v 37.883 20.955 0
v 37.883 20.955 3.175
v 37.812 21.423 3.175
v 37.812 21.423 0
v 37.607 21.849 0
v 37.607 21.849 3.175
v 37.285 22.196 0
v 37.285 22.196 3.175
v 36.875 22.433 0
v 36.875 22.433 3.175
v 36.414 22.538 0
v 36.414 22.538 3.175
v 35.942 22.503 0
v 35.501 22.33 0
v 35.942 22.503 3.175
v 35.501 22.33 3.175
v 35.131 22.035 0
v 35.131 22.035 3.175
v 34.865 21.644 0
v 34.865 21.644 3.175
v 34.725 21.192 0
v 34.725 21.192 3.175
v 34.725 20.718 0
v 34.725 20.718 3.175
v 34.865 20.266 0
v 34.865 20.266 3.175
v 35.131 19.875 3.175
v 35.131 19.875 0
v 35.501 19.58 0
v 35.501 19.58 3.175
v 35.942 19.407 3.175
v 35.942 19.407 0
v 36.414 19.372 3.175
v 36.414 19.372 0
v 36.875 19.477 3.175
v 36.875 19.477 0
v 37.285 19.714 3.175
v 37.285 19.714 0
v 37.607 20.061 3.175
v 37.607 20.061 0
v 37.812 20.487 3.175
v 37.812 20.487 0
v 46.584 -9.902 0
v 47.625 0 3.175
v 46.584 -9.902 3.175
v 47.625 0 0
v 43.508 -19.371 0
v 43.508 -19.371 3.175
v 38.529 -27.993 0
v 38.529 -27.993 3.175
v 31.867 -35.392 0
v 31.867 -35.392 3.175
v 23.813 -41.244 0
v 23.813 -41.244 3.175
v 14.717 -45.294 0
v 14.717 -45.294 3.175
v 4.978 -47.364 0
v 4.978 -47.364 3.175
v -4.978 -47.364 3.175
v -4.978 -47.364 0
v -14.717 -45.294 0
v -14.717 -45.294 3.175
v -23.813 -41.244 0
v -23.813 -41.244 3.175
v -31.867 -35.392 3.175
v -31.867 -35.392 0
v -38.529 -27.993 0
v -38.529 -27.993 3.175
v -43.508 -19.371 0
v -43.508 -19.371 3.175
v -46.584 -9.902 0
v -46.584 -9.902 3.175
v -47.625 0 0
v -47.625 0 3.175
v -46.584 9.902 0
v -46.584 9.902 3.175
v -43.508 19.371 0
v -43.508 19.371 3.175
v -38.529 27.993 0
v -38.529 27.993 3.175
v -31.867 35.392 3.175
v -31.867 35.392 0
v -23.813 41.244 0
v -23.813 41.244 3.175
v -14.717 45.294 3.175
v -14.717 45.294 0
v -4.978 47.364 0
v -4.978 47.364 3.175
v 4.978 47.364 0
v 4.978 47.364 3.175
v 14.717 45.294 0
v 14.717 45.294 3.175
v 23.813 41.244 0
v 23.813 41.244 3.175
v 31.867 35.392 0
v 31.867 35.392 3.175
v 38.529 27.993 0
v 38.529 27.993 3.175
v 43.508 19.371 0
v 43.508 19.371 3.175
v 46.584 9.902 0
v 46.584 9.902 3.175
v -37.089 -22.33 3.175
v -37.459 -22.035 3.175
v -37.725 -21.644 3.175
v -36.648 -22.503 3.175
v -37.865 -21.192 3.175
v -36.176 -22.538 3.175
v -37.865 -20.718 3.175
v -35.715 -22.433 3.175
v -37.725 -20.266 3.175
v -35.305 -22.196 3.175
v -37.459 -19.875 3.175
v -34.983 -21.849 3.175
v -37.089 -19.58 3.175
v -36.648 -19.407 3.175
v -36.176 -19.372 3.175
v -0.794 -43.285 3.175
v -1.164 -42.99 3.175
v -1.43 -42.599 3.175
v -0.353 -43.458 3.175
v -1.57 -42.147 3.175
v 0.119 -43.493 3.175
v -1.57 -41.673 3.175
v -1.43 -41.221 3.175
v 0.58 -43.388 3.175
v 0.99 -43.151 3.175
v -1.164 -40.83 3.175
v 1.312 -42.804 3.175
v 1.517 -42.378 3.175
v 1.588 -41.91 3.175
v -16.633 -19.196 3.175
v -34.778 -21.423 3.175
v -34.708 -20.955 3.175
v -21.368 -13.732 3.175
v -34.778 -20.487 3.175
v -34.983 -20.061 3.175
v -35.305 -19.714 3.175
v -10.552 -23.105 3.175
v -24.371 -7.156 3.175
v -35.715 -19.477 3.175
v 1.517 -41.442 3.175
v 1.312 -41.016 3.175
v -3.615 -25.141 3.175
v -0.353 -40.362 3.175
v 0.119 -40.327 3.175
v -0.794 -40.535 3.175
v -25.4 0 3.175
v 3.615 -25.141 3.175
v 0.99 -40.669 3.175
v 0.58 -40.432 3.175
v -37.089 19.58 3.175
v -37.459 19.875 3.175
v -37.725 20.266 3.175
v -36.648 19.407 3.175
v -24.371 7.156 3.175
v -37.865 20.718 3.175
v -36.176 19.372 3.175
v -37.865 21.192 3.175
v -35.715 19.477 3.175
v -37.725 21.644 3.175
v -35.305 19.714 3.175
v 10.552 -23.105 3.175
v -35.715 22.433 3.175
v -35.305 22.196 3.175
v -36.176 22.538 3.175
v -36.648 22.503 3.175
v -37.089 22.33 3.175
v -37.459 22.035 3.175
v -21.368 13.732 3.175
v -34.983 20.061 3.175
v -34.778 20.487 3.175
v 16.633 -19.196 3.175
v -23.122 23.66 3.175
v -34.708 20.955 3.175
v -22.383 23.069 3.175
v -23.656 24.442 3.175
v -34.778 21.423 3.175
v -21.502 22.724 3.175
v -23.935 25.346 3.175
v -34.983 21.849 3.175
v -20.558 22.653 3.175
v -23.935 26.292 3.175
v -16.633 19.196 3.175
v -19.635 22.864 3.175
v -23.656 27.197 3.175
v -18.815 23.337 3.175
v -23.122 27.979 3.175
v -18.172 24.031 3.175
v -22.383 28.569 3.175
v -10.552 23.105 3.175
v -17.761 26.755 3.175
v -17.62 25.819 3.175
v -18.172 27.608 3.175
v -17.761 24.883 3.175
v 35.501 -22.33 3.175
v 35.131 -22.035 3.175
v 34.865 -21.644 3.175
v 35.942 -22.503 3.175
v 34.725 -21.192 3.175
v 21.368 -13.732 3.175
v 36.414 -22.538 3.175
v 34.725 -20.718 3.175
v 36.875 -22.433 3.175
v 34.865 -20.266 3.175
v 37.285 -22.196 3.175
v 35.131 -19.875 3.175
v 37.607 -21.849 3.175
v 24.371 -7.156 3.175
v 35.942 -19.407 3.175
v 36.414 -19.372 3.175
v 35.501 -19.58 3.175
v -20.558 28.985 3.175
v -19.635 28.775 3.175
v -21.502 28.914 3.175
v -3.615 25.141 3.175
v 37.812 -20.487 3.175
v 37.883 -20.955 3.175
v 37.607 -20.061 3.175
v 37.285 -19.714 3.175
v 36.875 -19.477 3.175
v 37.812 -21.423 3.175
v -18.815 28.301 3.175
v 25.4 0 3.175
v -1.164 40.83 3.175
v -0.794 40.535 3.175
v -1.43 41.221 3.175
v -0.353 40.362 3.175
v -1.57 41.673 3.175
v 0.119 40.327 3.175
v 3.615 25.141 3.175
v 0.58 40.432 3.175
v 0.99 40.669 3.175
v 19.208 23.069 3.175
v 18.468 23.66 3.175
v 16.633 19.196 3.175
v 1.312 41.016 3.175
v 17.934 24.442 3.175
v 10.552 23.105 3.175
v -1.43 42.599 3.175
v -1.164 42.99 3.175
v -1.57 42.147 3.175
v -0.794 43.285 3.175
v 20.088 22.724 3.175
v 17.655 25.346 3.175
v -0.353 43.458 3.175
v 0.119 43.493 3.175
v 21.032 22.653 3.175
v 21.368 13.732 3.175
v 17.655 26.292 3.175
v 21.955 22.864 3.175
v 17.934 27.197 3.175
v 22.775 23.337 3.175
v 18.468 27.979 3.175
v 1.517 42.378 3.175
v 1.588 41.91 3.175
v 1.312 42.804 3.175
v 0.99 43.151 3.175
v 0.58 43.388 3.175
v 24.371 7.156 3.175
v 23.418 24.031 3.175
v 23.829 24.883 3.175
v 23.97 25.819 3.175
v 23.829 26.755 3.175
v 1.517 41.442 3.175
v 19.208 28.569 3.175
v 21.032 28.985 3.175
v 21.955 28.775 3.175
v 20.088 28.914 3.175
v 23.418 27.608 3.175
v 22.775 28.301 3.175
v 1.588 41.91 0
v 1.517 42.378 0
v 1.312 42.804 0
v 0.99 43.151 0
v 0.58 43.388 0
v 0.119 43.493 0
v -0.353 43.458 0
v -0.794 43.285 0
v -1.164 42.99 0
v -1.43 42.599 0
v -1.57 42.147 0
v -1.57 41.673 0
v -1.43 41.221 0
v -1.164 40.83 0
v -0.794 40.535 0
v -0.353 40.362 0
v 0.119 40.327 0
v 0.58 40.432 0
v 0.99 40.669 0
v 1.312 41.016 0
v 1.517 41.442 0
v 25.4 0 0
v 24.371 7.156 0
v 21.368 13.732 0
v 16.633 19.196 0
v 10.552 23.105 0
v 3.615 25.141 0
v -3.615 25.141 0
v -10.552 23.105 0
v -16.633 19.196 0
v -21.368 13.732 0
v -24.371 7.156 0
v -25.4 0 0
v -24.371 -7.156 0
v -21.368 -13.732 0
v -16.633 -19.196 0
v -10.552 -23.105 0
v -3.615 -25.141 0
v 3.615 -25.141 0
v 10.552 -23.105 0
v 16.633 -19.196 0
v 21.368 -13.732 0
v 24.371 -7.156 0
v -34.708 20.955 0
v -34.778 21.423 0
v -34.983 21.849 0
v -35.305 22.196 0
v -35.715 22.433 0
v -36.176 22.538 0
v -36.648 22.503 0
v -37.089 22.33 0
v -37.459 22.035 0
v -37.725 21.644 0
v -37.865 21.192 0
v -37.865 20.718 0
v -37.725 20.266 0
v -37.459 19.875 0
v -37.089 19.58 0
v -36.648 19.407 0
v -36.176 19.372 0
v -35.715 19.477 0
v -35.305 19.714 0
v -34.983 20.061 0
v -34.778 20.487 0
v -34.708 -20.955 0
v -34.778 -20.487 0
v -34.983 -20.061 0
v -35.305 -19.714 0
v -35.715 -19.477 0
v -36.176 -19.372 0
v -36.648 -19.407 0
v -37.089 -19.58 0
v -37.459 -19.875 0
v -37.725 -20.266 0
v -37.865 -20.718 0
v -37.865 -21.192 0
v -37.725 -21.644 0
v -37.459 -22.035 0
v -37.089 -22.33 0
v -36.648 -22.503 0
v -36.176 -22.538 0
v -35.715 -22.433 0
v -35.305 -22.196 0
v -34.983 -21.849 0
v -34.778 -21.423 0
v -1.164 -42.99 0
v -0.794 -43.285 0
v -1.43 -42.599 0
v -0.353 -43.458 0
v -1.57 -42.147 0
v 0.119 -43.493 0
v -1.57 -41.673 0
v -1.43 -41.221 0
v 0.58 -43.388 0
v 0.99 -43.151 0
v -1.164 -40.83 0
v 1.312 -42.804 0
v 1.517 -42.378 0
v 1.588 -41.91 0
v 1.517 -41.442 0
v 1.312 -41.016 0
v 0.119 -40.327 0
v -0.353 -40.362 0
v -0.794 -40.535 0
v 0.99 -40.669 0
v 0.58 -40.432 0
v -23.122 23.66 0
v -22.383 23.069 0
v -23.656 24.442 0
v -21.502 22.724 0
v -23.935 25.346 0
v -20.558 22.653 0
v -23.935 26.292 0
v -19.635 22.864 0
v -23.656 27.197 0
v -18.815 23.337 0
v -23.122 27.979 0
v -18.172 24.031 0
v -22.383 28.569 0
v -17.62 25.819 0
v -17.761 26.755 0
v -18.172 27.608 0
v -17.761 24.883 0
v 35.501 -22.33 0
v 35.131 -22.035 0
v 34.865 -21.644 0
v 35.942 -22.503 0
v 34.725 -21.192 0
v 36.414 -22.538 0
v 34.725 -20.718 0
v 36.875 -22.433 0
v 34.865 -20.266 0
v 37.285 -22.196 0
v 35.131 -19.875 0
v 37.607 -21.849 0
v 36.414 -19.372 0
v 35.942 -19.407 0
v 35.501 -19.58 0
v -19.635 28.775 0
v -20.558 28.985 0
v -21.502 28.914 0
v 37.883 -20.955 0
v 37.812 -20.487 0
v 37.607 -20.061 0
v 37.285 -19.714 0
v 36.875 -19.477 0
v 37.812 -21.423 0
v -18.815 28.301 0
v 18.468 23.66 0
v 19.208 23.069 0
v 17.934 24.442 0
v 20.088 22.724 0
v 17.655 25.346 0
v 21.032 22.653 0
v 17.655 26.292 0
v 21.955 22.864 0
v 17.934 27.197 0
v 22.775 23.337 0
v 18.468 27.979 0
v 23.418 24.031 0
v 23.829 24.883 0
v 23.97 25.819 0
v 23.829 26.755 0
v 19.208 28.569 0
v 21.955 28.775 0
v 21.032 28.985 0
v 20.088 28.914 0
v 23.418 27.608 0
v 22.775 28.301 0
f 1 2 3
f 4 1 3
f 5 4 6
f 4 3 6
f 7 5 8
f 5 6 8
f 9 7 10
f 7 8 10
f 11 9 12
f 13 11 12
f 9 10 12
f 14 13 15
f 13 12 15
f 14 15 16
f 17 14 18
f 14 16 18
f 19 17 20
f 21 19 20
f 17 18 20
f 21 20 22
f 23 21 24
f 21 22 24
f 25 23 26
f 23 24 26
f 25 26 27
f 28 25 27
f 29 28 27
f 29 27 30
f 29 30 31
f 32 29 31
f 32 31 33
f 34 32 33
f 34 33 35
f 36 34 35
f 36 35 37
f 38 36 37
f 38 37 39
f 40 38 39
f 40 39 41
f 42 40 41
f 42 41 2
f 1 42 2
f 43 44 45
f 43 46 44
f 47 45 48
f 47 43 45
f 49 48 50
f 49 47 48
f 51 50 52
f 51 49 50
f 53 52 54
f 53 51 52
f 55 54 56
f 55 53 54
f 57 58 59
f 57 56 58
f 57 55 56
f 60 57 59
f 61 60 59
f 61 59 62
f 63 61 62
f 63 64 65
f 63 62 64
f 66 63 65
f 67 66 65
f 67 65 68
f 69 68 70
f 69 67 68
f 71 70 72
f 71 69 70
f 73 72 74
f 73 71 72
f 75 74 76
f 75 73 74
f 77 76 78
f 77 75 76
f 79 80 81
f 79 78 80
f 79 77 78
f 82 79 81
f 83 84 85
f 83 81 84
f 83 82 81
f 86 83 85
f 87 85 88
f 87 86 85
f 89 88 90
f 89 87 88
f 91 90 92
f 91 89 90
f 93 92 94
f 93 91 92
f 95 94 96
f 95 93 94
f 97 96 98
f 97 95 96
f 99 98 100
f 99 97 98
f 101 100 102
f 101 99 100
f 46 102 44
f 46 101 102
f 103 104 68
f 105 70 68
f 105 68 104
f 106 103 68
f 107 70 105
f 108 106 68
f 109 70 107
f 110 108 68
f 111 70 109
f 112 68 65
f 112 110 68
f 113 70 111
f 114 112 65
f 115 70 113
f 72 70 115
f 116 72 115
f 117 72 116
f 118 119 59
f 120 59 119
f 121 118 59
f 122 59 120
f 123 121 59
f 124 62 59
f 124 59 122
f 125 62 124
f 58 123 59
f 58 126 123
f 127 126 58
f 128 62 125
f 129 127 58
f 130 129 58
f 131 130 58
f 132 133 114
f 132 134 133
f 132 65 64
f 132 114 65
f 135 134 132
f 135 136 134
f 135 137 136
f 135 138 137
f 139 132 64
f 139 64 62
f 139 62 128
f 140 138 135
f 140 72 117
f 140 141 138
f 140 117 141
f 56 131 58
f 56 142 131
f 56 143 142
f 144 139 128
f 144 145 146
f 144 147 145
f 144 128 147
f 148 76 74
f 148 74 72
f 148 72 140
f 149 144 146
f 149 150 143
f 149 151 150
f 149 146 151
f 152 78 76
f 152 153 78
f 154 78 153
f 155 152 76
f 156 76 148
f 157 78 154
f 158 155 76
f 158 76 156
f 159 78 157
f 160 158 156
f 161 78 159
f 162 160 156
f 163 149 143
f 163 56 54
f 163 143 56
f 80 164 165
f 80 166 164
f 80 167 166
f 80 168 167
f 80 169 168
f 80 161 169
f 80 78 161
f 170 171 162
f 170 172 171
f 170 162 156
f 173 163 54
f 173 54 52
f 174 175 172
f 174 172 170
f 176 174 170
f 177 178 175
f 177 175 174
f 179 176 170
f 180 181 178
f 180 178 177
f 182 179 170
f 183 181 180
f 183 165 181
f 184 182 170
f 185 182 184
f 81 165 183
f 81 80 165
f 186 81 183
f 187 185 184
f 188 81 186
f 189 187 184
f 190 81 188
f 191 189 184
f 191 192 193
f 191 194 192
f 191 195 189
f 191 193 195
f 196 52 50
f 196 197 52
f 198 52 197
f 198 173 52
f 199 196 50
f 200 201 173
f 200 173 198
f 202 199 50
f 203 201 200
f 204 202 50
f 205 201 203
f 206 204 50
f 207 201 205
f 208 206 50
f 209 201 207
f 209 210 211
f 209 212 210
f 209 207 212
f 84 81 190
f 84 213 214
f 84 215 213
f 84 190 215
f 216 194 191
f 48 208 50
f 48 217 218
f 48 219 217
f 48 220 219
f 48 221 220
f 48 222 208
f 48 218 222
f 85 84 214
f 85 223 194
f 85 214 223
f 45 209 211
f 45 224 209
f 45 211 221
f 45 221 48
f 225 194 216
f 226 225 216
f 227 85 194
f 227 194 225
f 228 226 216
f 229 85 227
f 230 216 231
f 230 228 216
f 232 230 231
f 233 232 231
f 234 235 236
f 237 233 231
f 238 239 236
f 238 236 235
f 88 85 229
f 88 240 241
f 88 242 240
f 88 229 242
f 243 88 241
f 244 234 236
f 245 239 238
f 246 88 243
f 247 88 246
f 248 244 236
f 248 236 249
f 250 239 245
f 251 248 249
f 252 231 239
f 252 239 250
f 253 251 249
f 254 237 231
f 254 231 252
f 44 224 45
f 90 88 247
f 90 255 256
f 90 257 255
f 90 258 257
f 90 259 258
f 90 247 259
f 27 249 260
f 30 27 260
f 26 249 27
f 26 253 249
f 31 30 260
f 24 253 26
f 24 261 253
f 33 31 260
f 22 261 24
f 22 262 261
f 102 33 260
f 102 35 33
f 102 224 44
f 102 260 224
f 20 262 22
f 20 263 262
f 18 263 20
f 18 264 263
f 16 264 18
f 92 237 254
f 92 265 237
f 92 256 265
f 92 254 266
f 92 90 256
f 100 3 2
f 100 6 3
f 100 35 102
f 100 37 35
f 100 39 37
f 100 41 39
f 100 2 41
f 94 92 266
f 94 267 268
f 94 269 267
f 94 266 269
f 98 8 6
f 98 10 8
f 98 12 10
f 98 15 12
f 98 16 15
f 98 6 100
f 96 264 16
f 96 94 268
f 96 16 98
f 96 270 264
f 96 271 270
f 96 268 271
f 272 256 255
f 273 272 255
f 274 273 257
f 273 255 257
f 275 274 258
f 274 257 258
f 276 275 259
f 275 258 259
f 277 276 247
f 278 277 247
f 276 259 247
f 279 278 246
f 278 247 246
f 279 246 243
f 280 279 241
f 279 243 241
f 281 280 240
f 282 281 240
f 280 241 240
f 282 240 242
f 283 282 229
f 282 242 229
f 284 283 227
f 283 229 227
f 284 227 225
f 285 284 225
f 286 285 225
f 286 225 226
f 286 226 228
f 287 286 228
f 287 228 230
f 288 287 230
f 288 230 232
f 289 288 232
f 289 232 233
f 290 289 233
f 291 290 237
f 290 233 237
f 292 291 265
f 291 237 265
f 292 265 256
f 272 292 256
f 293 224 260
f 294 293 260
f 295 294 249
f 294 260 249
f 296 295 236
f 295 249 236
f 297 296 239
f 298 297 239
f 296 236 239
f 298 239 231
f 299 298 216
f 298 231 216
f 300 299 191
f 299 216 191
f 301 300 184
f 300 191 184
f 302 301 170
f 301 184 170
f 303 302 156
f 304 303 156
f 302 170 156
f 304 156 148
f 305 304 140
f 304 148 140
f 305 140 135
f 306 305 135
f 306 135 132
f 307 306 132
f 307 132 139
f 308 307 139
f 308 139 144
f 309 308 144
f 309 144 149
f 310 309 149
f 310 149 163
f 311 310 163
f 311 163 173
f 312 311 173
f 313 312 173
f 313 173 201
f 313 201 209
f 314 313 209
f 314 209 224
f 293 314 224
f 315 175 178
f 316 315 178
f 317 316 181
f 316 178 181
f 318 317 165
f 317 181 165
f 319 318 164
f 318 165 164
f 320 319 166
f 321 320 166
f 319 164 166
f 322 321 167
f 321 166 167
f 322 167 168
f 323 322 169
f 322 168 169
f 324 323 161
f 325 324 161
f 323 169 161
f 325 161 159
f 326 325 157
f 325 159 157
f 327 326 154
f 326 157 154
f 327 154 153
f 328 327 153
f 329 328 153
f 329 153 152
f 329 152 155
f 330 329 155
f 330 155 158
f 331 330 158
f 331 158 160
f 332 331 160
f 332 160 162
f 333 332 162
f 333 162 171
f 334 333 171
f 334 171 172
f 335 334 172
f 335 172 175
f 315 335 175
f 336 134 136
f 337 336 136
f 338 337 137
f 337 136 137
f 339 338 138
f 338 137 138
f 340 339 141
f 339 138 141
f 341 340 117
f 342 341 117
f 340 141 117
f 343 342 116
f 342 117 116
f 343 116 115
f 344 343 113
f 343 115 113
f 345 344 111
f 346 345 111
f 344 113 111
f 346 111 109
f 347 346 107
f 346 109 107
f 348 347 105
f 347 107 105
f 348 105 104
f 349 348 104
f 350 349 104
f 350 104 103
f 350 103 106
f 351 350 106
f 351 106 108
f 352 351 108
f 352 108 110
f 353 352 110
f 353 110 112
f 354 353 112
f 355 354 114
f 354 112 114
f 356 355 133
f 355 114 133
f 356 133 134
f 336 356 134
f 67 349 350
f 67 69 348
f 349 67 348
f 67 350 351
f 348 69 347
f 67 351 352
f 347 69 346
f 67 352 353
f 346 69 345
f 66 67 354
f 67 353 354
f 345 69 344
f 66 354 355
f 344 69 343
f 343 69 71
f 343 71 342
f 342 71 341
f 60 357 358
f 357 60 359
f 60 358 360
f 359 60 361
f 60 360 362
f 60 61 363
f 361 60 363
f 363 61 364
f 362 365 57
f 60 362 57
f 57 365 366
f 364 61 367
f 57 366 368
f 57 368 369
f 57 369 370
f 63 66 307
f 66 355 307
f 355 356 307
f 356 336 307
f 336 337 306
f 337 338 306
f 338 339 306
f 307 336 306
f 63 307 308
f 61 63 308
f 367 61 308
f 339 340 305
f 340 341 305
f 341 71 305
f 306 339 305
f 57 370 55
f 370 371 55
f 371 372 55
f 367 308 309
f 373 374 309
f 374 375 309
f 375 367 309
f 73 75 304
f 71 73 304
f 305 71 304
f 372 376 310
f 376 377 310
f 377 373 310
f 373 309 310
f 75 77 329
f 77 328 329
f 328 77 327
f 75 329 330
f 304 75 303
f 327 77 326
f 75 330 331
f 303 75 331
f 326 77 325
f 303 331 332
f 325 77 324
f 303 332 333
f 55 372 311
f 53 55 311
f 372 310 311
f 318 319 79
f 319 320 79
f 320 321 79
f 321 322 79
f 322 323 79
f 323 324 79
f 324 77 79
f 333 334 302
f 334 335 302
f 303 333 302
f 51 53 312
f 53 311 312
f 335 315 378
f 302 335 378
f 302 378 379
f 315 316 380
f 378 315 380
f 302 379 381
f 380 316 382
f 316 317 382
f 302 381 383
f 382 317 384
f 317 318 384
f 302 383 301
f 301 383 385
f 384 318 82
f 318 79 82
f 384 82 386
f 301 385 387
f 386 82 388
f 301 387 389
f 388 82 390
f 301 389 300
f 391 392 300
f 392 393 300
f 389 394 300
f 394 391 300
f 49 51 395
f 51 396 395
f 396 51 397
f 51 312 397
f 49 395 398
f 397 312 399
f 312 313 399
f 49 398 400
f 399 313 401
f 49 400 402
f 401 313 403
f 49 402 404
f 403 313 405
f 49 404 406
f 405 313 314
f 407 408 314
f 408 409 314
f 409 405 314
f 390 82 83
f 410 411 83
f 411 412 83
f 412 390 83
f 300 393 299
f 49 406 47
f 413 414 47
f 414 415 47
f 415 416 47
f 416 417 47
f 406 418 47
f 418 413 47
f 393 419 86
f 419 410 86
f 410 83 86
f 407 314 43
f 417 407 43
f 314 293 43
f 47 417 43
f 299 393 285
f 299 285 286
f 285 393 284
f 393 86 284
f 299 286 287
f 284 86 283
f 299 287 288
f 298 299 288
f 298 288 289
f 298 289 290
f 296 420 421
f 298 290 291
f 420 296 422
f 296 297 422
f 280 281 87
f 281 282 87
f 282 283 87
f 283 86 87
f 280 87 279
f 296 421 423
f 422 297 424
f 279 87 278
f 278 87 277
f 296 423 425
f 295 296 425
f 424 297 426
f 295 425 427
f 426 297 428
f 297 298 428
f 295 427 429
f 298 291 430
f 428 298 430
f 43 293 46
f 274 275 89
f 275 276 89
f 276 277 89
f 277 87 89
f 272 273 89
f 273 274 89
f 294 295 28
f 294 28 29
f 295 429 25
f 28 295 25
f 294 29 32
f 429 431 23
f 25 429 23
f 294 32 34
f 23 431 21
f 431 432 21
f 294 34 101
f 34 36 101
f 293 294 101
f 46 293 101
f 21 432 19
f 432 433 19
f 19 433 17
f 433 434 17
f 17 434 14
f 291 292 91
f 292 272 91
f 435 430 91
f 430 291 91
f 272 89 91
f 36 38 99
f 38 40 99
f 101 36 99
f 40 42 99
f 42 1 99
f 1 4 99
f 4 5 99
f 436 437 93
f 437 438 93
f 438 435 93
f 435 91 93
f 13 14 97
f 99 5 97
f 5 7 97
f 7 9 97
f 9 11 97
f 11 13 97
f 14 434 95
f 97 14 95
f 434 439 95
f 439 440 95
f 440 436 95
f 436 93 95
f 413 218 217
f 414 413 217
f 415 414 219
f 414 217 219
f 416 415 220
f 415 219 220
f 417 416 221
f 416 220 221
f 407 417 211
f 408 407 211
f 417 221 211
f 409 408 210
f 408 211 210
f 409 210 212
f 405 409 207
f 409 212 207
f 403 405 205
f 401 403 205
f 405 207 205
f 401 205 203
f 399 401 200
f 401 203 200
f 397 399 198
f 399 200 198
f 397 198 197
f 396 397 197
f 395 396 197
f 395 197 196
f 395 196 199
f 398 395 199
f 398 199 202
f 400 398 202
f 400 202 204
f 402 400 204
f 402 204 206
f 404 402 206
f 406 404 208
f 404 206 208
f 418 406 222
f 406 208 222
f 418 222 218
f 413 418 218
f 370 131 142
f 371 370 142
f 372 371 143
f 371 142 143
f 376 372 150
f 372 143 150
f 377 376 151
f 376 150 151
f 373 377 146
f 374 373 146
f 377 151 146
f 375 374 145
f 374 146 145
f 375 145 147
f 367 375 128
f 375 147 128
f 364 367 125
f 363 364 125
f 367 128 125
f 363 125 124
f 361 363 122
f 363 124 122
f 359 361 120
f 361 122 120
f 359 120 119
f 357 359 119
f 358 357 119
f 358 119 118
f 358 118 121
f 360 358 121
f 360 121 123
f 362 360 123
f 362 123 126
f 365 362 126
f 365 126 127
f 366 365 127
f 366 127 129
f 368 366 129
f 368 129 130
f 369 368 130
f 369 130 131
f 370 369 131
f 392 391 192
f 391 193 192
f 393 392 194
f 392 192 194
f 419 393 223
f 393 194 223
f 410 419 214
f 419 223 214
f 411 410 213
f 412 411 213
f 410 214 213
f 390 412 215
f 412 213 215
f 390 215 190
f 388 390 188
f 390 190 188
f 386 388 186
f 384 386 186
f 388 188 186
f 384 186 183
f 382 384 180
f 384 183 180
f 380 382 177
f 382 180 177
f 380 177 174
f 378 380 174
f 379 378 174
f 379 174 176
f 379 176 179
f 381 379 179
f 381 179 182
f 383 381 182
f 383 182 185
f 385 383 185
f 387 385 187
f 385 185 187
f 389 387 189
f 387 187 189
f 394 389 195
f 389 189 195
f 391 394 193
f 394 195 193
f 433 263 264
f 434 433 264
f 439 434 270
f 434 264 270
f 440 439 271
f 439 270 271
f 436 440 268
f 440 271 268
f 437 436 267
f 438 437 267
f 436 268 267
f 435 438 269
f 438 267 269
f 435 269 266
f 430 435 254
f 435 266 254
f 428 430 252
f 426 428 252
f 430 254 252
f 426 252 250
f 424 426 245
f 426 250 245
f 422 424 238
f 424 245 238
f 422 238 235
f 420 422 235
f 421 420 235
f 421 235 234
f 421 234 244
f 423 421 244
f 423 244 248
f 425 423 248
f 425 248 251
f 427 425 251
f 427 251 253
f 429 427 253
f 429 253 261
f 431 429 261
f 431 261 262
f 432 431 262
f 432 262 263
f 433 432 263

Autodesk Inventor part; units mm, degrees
ref_plane "YZ Plane" through (0, 0, 0) normal (1, 0, 0) x (0, 1, 0)
ref_plane "XZ Plane" through (0, 0, 0) normal (0, 1, 0) x (-1, 0, 0)
ref_plane "XY Plane" through (0, 0, 0) normal (0, 0, 1) x (1, 0, 0)
sketch "Sketch1" plane through (0, 0, 0) normal (0, 0, 1) x (1, 0, 0)
  circle A0 centre (0, 0) radius 47.625
  dimension "d0" = 95.25
extrude "Extrusion1" add sketch "Sketch1" along normal blind 3.175
sketch "Sketch2" plane through (0, 0, 3.175) normal (0, 0, 1) x (1, 0, 0)
  circle A0 centre (0, 41.91) radius 1.5875
  circle A1 centre (-36.2951, 20.955) radius 1.5875
  circle A2 centre (-36.2951, -20.955) radius 1.5875
  circle A3 centre (0, -41.91) radius 1.5875
  circle A4 centre (36.2951, -20.955) radius 1.5875
  circle A5 centre (36.2951, 20.955) radius 1.5875
  point P0 (0, 0)
  dimension "d3" = 3.175
  dimension "d4" = 41.91
  dimension "d7" = 360
extrude "Extrusion2" cut sketch "Sketch2" against normal blind 3.175
sketch "Sketch3" plane through (0, 0, 3.175) normal (0, 0, 1) x (1, 0, 0)
  circle A0 centre (0, 0) radius 25.4
  dimension "d11" = 50.8
extrude "Extrusion3" cut sketch "Sketch3" against normal blind 3.175
sketch "Sketch4" plane through (0, 0, 3.175) normal (0, 0, 1) x (1, 0, 0)
  circle A0 centre (20.795, 25.8191) radius 3.175
  line L0 (0, 0) -> (0, 9.1169)
  circle A1 centre (-20.795, 25.8191) radius 3.175
  dimension "d14" = 6.35
  dimension "d15" = 25.8191
  dimension "d16" = 20.795
extrude "Extrusion4" cut sketch "Sketch4" against normal blind 25.4
properties part number "aftSealInsideDisc" material "ABS Plastic"
